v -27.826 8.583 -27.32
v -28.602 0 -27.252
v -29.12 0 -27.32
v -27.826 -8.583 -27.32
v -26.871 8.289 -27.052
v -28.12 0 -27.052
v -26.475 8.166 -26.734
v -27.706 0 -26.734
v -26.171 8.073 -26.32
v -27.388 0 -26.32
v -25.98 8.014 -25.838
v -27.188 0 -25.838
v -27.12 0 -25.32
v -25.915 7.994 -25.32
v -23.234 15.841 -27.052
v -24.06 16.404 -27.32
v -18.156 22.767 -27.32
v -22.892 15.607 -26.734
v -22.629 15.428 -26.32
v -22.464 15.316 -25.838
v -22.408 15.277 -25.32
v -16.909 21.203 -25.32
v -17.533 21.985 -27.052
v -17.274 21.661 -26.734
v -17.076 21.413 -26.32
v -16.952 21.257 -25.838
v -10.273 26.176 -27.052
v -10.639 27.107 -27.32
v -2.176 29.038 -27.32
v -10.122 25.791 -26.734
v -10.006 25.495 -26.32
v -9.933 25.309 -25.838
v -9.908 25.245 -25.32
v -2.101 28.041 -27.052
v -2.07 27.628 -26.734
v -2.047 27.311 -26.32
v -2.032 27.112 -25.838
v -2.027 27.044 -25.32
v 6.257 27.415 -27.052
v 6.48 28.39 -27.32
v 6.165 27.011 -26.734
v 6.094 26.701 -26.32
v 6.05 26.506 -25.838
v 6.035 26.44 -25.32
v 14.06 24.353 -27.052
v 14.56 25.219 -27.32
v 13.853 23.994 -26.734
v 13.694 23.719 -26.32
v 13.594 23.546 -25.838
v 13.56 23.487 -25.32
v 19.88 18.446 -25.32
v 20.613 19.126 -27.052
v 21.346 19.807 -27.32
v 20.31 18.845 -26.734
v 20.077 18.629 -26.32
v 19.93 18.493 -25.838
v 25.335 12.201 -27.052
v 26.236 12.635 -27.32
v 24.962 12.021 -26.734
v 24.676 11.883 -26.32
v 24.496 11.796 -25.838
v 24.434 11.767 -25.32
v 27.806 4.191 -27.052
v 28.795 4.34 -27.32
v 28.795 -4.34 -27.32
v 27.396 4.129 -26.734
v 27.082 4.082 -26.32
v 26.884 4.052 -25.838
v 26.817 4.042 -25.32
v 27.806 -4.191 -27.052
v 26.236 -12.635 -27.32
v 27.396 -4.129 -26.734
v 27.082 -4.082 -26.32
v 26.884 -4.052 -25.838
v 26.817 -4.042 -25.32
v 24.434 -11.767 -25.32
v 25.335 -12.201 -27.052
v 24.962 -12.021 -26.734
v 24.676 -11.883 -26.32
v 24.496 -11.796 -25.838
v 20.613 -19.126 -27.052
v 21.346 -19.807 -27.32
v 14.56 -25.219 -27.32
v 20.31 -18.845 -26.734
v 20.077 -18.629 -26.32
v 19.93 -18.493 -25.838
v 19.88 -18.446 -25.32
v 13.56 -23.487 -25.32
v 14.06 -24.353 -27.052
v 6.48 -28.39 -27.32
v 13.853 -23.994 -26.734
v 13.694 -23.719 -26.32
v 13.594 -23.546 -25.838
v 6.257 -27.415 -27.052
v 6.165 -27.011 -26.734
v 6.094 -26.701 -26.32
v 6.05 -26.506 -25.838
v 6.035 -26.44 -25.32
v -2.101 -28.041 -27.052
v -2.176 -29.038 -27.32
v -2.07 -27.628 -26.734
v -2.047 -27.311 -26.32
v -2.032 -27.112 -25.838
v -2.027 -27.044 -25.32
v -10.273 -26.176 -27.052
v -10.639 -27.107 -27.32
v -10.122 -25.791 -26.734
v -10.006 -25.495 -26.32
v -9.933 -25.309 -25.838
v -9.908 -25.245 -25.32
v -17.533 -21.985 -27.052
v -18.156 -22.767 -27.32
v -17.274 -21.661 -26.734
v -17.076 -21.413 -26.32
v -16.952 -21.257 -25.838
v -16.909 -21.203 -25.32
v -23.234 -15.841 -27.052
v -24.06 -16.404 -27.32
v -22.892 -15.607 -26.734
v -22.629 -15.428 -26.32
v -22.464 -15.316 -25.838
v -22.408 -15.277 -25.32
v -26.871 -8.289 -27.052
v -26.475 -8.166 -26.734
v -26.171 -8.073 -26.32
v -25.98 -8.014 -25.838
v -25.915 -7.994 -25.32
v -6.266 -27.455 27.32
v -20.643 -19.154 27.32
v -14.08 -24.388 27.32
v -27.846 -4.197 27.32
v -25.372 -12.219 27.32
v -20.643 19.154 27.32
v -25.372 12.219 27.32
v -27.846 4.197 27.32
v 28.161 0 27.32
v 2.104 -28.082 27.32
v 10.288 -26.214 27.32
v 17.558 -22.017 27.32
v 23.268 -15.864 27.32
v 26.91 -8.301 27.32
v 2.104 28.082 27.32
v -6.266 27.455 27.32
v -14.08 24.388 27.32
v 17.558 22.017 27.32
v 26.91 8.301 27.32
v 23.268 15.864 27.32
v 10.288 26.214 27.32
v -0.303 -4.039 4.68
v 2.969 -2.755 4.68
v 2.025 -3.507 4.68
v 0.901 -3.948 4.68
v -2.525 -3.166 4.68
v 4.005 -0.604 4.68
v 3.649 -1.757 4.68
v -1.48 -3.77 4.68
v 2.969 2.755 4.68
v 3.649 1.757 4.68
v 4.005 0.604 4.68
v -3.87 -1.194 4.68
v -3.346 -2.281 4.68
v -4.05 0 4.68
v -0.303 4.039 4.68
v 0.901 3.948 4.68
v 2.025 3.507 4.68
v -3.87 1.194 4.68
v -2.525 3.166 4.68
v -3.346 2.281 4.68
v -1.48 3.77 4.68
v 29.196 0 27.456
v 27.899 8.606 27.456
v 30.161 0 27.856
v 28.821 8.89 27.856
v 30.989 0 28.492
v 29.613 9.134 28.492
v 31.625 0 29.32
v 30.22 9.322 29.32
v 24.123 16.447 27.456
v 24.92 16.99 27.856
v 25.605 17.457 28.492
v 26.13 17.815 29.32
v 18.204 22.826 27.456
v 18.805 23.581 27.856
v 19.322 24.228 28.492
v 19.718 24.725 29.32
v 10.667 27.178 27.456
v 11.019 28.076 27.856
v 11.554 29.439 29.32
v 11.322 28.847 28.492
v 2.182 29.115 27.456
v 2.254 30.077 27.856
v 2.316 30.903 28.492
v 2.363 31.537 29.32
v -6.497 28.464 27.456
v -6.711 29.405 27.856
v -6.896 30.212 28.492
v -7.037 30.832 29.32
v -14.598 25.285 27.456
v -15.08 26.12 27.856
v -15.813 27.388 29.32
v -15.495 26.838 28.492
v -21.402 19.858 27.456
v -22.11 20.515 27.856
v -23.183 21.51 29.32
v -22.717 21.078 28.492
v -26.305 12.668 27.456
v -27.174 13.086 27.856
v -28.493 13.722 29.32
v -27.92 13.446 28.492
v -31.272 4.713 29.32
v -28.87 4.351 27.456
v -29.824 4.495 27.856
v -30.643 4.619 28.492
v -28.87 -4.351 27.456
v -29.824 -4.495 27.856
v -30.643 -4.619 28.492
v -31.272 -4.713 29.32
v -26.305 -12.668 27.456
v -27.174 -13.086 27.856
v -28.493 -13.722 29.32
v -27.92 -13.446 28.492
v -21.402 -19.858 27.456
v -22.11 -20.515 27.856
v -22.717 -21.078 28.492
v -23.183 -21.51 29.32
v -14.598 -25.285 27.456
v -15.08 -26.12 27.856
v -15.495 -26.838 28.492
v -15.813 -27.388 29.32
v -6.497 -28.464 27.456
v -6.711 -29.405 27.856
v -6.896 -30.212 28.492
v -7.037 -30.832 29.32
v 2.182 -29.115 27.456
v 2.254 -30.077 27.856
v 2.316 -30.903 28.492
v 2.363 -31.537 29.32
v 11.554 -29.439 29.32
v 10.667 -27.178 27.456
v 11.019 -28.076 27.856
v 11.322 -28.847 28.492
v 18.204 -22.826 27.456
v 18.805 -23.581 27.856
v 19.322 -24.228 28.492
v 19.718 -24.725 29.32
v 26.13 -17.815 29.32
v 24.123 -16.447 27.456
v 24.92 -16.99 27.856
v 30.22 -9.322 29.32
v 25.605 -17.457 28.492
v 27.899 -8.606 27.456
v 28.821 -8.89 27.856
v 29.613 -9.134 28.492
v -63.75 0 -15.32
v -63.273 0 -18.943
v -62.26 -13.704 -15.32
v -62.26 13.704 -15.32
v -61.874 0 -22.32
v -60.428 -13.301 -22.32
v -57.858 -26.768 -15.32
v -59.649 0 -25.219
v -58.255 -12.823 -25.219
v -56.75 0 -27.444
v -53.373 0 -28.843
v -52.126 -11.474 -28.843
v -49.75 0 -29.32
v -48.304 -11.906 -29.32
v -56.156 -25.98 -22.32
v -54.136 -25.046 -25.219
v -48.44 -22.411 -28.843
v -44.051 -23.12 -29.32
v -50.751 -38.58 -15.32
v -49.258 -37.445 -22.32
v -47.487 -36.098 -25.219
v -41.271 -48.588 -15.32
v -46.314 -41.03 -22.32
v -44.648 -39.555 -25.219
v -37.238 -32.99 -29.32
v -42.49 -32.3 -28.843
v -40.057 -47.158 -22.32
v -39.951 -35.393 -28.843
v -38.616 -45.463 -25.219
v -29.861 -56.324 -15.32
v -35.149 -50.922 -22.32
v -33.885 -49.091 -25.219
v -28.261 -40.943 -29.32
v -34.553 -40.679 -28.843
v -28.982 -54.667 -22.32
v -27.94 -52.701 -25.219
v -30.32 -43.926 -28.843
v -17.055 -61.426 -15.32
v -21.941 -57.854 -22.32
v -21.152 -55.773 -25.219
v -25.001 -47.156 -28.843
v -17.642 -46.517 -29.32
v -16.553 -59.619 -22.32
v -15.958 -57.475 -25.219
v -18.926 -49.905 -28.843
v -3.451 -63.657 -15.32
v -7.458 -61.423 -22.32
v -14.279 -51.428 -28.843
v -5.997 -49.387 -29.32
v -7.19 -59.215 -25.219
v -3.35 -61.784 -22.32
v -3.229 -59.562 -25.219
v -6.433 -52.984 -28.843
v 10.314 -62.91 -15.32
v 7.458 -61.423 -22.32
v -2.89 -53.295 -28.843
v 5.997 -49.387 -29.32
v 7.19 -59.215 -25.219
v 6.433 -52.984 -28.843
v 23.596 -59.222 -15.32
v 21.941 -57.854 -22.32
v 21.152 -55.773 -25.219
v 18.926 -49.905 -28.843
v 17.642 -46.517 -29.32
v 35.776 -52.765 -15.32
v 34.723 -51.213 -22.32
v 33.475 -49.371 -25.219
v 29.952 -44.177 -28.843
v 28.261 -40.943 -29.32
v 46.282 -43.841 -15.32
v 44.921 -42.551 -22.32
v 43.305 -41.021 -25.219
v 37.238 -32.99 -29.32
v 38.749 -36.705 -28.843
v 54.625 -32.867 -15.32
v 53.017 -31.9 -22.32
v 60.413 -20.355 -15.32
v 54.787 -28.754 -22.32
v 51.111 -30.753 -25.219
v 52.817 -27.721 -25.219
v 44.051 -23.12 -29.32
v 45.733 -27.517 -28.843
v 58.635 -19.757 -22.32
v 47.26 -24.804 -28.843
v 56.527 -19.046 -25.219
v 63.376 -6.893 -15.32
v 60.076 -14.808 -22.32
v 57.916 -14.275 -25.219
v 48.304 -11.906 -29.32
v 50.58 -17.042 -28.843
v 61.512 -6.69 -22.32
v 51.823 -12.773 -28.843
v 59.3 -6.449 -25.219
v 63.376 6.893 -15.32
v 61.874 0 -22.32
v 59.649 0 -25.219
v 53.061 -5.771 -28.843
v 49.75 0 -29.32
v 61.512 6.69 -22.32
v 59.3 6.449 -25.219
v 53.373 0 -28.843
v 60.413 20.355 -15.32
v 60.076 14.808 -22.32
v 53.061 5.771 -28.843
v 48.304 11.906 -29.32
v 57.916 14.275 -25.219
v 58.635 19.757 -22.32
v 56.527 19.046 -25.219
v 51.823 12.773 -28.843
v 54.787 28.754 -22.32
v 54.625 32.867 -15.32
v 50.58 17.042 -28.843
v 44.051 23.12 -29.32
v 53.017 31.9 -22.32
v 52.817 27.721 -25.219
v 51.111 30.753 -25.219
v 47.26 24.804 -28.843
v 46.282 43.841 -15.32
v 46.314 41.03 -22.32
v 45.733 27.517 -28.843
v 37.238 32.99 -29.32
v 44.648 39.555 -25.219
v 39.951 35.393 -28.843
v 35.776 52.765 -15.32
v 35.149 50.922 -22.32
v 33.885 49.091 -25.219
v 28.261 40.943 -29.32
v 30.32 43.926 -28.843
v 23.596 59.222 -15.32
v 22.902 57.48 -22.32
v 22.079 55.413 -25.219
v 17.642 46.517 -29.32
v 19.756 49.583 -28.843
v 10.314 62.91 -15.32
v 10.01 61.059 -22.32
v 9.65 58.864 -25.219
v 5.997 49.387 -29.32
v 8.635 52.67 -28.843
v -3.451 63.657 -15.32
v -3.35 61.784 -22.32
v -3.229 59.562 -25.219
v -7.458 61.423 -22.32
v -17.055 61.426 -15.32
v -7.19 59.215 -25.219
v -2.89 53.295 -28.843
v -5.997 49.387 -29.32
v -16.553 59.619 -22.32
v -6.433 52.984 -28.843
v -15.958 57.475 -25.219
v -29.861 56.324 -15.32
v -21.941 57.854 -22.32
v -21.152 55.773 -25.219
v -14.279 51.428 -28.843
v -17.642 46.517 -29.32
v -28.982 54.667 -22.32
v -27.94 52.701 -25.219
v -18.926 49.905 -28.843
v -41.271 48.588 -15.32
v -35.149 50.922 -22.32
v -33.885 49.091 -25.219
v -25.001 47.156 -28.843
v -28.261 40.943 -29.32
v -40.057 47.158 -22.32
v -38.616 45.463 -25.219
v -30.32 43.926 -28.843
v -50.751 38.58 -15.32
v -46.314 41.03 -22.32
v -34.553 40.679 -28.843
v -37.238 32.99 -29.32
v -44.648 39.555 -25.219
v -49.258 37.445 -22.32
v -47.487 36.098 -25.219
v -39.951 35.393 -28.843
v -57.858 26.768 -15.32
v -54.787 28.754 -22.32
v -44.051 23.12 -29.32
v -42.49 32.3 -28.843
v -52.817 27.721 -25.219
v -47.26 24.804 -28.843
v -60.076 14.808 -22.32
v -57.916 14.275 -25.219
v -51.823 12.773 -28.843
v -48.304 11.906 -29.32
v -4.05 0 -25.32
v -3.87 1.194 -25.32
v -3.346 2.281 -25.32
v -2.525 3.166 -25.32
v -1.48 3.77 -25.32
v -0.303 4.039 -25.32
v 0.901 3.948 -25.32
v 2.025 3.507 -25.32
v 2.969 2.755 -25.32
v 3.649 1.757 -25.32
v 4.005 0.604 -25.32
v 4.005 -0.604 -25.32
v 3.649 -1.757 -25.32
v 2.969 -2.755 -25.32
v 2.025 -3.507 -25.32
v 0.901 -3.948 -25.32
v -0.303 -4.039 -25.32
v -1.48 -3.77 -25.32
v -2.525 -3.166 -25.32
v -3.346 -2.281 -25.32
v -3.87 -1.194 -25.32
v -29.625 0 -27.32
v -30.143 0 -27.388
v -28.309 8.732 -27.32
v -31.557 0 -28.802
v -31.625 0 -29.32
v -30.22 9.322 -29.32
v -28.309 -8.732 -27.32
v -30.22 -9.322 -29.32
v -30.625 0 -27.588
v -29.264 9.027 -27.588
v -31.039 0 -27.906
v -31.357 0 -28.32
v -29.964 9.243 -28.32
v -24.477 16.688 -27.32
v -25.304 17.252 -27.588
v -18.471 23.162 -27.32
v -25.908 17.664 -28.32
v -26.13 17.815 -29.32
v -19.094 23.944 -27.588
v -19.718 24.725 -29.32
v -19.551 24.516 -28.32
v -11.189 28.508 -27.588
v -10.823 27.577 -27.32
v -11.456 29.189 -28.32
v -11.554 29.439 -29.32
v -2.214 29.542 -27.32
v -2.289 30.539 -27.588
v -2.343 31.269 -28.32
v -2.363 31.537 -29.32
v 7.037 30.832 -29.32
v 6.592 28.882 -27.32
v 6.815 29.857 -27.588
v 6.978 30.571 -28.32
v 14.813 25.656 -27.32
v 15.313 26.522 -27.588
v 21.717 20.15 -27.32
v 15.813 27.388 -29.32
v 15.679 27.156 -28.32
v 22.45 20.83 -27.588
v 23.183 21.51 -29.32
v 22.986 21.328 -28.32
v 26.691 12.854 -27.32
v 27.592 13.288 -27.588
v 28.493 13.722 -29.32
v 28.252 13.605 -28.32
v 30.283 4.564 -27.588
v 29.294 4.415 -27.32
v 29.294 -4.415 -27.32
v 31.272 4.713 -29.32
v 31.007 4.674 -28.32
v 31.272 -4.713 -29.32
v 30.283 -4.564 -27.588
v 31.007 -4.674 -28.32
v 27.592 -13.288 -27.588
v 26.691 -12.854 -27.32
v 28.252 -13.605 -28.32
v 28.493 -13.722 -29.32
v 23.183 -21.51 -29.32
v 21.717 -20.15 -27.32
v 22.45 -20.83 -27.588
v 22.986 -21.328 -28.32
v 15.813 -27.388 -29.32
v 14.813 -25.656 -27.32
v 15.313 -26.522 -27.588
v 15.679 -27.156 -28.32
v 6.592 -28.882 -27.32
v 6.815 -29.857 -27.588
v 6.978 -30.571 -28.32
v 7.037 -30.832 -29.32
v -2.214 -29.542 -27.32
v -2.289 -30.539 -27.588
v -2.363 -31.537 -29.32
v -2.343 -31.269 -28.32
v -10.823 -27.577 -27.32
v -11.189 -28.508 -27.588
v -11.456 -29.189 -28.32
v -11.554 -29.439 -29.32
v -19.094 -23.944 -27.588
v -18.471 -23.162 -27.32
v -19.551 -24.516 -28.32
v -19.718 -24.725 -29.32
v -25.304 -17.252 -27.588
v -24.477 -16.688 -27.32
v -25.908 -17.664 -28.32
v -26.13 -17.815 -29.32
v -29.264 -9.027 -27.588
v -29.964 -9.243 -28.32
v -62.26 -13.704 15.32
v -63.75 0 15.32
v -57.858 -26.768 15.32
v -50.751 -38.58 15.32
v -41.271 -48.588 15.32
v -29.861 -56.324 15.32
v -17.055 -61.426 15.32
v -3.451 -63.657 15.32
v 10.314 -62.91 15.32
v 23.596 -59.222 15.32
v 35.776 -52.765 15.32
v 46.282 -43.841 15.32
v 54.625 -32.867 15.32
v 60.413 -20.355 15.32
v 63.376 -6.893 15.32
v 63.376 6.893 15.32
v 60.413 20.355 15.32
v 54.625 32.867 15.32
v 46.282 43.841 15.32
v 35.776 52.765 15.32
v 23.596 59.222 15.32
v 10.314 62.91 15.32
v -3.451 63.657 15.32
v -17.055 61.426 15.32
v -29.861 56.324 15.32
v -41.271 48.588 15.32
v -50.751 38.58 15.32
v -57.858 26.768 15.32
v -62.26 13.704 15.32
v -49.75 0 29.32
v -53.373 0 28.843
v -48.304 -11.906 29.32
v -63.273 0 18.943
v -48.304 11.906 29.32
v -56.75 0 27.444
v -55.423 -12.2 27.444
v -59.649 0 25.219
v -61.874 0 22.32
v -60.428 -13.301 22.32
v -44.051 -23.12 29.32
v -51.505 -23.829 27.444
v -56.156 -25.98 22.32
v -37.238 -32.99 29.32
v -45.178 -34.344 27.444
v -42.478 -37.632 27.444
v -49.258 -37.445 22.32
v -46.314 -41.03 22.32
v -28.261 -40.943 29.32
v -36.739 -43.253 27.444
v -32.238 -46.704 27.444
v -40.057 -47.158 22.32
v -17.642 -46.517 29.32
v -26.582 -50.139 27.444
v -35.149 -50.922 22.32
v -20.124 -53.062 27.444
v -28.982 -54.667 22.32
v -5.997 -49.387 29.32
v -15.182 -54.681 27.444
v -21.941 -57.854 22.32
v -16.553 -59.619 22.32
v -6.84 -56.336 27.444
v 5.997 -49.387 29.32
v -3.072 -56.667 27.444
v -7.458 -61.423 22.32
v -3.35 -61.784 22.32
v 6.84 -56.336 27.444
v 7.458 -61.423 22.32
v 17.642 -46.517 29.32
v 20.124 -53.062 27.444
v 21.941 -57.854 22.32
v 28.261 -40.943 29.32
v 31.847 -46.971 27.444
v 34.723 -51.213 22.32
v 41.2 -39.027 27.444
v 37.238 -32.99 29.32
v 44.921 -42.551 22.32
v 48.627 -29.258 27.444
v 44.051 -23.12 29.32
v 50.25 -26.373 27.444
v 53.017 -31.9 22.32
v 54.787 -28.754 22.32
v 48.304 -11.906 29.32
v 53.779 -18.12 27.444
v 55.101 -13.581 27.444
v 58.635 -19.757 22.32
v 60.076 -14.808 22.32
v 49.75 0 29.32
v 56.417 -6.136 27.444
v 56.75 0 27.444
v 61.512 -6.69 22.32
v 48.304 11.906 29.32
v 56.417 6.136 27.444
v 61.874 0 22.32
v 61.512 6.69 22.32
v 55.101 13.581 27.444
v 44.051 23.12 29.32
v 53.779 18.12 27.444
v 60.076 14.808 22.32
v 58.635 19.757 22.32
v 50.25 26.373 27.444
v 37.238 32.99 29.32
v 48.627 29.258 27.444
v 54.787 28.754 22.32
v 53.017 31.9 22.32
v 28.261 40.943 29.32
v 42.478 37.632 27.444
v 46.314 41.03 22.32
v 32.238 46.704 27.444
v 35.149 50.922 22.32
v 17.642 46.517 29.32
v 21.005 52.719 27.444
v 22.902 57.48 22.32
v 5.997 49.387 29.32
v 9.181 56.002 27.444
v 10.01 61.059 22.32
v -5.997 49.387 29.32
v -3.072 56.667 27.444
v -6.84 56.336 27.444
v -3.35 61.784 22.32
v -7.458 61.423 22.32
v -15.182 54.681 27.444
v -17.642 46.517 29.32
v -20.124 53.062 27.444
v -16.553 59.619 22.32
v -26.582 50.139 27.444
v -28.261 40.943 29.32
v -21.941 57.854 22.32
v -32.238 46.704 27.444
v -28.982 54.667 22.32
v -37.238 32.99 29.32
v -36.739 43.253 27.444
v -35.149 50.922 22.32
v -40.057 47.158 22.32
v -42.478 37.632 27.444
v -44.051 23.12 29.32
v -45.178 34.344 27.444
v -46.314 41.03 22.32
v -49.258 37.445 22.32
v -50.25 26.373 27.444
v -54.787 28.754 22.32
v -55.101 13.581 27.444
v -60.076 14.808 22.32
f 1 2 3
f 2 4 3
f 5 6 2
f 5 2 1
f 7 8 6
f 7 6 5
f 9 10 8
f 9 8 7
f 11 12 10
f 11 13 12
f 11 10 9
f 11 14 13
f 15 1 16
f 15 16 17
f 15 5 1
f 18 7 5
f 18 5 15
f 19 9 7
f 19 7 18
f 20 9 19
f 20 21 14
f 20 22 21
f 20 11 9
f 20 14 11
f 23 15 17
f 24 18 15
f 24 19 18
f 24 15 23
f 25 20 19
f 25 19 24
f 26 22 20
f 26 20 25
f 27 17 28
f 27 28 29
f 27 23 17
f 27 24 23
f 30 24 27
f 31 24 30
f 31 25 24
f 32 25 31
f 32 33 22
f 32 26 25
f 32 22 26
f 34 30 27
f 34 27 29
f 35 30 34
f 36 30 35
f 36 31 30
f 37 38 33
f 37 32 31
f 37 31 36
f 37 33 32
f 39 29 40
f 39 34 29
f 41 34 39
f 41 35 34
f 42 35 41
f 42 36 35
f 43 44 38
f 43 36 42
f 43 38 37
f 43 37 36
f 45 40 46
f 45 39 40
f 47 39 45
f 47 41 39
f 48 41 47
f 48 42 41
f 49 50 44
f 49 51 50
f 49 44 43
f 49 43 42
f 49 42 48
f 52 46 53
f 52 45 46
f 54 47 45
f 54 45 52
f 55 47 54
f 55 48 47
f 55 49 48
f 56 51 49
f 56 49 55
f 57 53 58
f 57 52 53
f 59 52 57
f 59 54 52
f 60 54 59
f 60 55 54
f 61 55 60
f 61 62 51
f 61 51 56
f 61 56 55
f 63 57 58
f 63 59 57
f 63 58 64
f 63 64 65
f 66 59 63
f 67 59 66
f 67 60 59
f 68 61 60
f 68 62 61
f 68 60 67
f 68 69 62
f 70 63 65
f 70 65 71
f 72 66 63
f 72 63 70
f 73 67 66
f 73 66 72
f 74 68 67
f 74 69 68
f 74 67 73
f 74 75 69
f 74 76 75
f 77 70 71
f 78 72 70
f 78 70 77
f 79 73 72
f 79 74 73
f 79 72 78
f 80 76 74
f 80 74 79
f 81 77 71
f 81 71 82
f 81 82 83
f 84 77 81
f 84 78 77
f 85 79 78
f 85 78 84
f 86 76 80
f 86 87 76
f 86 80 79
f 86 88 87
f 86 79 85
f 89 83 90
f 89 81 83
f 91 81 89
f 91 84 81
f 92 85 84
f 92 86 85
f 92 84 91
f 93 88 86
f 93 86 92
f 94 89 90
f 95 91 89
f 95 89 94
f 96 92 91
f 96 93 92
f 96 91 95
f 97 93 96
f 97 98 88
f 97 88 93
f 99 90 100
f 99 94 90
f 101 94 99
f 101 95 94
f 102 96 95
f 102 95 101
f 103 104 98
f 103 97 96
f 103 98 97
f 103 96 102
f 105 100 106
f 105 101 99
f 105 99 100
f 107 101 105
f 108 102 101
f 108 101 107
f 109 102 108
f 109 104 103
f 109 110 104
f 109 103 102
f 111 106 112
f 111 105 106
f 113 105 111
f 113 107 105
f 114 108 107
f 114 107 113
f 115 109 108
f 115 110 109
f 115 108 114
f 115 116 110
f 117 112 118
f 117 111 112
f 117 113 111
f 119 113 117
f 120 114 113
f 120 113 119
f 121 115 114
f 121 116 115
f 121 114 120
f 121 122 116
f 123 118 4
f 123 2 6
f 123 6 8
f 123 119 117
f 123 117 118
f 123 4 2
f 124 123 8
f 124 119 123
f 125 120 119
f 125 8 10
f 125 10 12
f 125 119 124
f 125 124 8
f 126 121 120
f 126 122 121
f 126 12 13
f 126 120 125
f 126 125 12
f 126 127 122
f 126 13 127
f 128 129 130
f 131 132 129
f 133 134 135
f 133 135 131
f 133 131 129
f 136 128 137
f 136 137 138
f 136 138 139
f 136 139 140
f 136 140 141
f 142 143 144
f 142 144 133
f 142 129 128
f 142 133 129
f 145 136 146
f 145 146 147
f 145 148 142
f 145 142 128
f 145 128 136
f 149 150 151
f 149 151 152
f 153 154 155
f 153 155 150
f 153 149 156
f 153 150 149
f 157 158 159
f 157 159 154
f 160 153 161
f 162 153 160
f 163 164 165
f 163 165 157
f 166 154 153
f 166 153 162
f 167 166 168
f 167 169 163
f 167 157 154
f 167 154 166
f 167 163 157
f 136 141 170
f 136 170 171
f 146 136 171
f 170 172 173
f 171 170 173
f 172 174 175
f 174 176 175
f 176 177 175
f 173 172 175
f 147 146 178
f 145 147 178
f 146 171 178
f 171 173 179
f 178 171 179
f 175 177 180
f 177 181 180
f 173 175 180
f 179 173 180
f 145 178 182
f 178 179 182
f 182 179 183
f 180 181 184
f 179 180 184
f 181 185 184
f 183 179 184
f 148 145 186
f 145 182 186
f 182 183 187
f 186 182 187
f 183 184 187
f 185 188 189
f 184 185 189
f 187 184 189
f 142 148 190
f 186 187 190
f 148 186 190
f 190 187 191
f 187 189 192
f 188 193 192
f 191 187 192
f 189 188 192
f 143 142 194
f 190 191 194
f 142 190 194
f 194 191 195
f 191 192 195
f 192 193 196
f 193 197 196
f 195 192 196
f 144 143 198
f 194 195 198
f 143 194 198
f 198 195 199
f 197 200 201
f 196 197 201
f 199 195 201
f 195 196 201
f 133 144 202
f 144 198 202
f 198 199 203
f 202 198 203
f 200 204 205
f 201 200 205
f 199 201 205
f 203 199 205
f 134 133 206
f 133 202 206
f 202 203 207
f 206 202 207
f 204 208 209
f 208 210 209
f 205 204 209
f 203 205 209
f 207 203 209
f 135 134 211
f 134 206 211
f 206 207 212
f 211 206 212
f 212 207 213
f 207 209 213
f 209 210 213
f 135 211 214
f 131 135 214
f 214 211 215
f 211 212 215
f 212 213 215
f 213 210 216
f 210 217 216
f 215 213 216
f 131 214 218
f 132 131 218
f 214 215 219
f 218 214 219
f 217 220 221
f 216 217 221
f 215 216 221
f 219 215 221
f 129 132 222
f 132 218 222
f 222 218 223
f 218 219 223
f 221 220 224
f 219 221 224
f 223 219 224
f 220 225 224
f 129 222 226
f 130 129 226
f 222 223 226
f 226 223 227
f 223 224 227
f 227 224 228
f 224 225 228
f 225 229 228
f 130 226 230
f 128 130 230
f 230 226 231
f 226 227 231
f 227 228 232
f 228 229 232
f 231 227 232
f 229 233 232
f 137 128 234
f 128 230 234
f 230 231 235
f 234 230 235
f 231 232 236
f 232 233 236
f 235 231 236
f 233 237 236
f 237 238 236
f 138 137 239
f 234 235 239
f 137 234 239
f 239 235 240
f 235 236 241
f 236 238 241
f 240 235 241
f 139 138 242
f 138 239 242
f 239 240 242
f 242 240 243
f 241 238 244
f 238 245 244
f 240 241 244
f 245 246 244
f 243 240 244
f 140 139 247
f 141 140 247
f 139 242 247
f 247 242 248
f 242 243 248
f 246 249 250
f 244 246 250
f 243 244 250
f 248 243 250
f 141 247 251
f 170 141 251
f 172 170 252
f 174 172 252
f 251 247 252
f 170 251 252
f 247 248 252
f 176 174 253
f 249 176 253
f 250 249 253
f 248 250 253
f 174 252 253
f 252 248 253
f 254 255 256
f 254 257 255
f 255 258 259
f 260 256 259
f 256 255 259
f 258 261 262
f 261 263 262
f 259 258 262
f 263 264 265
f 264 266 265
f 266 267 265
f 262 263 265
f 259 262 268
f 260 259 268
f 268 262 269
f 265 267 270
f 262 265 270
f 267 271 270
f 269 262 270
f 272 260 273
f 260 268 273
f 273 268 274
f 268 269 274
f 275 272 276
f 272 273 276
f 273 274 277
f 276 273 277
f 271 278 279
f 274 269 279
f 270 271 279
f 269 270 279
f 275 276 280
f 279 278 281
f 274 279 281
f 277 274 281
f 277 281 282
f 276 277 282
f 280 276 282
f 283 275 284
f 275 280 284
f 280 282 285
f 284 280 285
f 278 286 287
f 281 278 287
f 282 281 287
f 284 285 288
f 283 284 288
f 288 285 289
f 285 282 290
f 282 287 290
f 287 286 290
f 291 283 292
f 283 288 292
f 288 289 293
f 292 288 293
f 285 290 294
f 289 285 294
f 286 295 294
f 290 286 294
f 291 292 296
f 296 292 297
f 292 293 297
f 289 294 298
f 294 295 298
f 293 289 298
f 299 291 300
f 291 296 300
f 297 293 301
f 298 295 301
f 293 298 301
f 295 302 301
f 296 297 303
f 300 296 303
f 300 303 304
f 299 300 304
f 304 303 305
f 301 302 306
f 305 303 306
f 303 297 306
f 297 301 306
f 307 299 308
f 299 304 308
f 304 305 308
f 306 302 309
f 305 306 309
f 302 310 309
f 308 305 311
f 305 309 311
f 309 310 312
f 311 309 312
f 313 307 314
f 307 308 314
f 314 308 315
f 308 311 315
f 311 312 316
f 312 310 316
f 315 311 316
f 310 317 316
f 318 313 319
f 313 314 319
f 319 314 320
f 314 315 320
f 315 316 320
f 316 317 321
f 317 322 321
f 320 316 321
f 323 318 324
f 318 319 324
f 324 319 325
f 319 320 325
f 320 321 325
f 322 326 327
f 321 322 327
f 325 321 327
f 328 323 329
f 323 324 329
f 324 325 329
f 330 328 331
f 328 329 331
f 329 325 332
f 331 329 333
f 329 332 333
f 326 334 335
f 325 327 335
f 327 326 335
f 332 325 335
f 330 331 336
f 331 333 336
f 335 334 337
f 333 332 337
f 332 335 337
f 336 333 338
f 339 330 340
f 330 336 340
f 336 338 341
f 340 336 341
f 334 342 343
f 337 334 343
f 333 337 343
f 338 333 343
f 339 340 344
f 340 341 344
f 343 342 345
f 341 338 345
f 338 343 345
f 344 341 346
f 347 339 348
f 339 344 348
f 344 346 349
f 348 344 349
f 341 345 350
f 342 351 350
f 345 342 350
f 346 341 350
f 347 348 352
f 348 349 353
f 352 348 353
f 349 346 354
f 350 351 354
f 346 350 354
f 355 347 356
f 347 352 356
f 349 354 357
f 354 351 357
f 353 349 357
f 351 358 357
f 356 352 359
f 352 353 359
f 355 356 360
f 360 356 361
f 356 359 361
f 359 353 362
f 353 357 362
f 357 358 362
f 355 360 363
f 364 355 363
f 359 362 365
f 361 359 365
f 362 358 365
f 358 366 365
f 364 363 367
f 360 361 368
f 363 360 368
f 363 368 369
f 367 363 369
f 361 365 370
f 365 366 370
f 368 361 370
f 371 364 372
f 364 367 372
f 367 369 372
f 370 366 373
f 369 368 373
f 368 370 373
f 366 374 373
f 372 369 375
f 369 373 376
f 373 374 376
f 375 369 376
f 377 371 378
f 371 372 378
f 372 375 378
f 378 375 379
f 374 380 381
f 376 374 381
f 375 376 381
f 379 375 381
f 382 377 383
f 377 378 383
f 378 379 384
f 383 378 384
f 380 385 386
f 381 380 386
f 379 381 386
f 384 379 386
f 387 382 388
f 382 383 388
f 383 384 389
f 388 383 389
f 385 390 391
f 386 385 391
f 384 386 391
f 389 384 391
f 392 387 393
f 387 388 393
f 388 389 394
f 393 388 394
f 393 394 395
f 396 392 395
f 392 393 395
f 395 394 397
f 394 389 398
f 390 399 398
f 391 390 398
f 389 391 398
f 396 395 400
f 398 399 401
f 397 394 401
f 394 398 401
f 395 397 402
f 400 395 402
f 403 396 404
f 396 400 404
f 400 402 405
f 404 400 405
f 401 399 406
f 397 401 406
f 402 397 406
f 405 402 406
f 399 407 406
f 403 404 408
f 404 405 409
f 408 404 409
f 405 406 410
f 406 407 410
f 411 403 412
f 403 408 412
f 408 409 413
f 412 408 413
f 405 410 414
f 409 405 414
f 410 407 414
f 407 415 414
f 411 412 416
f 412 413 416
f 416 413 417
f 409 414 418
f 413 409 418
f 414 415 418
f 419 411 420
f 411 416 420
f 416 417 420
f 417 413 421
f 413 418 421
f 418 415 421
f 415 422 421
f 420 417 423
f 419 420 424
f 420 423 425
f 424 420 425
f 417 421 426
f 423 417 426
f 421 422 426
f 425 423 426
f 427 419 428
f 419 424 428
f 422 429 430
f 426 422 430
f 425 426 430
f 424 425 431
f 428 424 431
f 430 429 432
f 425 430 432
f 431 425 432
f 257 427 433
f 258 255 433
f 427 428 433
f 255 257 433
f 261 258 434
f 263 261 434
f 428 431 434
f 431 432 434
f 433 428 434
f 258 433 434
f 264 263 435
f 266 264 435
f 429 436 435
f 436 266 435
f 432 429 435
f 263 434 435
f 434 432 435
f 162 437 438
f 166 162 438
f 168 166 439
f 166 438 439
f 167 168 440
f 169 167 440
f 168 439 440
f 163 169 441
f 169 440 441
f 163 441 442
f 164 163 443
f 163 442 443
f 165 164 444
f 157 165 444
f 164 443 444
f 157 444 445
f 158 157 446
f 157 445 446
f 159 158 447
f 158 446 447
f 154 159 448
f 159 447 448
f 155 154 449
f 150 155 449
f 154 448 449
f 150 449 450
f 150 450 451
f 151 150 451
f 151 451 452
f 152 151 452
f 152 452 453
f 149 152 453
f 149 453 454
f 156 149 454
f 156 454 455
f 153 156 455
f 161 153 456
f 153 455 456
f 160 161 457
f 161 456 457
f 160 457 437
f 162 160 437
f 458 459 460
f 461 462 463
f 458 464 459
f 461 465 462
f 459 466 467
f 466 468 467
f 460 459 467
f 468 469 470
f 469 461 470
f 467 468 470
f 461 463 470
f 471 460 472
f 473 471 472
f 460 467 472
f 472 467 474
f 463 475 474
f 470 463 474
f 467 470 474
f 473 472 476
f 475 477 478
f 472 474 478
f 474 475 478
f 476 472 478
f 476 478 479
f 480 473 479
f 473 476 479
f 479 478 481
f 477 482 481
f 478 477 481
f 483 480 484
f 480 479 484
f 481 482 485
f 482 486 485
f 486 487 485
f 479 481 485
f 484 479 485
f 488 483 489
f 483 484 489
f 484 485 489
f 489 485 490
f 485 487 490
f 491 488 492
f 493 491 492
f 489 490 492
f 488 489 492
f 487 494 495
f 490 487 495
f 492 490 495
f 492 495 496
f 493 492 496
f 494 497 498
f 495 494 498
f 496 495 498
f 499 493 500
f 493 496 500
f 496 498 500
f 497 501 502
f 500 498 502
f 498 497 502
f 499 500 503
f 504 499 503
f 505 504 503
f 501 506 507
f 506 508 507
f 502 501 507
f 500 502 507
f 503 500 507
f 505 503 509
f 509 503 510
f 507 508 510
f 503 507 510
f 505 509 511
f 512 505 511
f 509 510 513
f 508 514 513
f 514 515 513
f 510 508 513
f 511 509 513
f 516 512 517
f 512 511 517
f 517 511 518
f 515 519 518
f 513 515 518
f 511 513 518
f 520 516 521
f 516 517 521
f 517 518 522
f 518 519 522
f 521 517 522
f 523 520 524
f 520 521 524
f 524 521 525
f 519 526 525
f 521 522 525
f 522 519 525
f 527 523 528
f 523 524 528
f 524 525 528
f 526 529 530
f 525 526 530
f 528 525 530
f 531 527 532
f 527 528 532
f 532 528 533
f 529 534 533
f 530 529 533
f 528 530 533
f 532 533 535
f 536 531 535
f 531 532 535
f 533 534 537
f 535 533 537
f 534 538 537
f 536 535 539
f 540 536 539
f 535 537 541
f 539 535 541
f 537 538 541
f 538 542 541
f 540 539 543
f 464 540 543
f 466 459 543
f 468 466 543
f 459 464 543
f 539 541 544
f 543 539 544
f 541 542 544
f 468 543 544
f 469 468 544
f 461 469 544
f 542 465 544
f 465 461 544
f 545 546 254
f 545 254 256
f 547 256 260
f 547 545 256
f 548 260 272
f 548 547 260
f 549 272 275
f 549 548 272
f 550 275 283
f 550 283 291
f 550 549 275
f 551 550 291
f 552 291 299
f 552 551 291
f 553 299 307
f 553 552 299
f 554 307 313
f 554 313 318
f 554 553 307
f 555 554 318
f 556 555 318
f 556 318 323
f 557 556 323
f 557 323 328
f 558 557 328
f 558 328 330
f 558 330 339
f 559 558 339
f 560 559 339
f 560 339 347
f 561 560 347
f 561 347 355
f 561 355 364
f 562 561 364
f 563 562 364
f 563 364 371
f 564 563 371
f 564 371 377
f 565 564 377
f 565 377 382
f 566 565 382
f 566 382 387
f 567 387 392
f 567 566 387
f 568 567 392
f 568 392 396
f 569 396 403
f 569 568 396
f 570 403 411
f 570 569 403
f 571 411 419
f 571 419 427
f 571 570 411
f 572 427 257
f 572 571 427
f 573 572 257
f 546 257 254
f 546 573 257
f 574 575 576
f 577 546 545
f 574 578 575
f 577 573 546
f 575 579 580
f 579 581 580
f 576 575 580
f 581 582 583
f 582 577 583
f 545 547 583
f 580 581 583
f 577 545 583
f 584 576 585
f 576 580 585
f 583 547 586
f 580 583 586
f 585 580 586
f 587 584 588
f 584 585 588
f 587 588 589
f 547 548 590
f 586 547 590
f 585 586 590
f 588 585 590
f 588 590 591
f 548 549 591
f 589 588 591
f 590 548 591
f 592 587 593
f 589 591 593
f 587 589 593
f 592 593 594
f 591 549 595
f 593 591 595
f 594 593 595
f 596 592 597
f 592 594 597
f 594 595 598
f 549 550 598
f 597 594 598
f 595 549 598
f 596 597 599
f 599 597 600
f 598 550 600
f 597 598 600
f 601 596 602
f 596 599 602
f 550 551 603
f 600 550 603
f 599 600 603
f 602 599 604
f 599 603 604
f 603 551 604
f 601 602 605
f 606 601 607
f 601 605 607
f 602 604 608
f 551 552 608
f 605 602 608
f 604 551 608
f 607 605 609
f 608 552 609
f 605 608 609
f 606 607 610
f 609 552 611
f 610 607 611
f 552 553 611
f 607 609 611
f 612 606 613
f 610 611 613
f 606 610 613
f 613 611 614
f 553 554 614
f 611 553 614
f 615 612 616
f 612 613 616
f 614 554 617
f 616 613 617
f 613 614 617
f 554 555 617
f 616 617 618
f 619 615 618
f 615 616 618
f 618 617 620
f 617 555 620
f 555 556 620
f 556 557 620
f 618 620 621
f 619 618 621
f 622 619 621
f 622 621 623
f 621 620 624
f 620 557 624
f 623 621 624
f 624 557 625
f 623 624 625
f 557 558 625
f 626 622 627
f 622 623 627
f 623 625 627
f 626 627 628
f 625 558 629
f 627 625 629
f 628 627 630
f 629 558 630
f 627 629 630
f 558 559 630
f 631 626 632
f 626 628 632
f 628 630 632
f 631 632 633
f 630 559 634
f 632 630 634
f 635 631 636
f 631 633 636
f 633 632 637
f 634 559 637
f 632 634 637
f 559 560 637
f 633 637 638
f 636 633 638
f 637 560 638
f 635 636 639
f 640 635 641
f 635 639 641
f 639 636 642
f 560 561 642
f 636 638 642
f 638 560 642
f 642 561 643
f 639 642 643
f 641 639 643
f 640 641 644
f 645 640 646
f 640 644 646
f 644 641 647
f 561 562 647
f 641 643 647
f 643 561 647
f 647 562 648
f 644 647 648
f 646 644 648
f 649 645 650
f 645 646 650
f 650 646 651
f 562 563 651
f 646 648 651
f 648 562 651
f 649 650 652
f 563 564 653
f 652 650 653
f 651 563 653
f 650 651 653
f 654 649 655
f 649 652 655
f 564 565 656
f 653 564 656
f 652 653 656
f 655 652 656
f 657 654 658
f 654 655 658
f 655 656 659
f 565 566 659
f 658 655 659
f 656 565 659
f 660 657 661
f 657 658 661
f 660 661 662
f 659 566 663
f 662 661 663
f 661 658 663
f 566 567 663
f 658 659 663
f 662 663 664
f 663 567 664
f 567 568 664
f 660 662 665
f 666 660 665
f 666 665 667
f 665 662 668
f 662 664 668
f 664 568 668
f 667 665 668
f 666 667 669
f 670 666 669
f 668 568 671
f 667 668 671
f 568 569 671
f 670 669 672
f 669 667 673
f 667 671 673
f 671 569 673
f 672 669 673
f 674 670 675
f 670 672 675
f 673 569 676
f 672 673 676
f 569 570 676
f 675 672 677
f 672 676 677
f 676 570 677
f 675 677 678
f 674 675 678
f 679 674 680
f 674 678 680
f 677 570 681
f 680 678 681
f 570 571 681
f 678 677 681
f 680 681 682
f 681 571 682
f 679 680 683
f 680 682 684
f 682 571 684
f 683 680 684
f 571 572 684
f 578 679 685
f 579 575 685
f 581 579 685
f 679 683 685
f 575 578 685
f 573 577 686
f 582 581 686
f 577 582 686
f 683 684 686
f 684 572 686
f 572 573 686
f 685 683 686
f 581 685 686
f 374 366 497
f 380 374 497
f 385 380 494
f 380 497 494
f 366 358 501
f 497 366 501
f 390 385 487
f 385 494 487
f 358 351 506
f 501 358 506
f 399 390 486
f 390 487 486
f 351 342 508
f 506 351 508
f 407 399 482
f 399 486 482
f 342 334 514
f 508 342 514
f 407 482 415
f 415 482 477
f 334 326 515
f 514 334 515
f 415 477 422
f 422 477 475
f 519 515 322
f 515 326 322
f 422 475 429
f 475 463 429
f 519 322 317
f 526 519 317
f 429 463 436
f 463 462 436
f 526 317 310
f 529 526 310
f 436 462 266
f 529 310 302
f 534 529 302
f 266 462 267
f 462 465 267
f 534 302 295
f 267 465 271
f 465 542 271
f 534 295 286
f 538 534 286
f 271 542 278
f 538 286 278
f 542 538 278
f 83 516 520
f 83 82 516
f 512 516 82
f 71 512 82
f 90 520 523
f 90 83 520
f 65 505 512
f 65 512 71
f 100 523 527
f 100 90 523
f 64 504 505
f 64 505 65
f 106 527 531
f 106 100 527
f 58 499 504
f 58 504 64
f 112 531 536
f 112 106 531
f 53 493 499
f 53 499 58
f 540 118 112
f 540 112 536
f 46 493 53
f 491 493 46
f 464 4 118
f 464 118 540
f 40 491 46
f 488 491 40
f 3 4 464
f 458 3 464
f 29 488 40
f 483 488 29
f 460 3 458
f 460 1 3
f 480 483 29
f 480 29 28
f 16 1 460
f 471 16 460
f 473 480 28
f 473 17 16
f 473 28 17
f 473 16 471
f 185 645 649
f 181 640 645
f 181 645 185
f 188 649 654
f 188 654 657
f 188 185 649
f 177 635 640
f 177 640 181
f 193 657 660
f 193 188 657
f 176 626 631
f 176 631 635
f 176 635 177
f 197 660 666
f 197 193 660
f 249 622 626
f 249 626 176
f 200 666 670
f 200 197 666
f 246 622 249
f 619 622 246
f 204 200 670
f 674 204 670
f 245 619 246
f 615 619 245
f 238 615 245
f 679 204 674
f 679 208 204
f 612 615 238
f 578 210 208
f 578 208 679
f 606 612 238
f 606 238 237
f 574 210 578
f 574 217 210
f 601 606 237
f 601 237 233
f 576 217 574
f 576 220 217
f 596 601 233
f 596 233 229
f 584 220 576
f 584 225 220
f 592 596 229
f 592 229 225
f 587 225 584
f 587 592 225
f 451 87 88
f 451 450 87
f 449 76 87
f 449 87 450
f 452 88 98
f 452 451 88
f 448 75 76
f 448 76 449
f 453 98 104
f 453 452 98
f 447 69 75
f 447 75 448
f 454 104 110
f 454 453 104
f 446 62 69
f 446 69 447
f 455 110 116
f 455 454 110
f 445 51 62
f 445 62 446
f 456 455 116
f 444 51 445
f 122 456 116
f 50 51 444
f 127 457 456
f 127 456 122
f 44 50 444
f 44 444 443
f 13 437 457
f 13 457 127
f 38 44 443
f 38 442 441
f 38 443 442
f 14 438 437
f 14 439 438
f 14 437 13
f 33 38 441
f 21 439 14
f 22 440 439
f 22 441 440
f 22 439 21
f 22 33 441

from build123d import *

# Parameters (mm, degrees)
CROQUIS1_R              = 63.75
SALIENTE_EXTRUIR1_DEPTH = 29.32
CROQUIS2_R              = 31.625
CORTAR_EXTRUIR1_DEPTH   = 2
REDONDEO2_R             = 4
REDONDEO3_R             = 14
CROQUIS4_R              = 31.625
CORTAR_EXTRUIR3_DEPTH   = 2
CROQUIS5_R              = 27.12
CORTAR_EXTRUIR4_DEPTH   = 2
REDONDEO4_R             = 14
CROQUIS6_R              = 4.05
CORTAR_EXTRUIR5_DEPTH   = 30
REDONDEO5_R             = 2
REDONDEO6_R             = 2


# Some blends are built 0.0001 mm under size
with BuildPart() as part:
    # Croquis1 → Saliente-Extruir1 (new, symmetric)
    with BuildSketch(Plane.XY):
        with Locations(Location((0, 0, 0), (0, 0, 180))):
            Circle(CROQUIS1_R)
    extrude(amount=SALIENTE_EXTRUIR1_DEPTH, both=True)

    # Croquis2 → Cortar-Extruir1 (cut)
    with BuildSketch(Plane.XY.offset(29.32)):
        Circle(CROQUIS2_R)
    extrude(amount=-CORTAR_EXTRUIR1_DEPTH, mode=Mode.SUBTRACT)

    # Redondeo2
    # the kernel refuses this fillet: 4 mm, written as the material it adds along each edge
    with BuildSketch(Plane(origin=(0, 0, 27.32), x_dir=(1, 0, 0), z_dir=(0, -1, 0))) as redondeo2_piece_1:
        with BuildLine():
            CenterArc((28.160898385, 4), REDONDEO2_R, 270, 60)
            Line((28.160898385, 0), (28.160898385, -0.08))
            Line((28.160898385, -0.08), (31.625, -0.08))
            Line((31.625, -0.08), (31.705, 0))
            ThreePointArc((31.705, 0), (31.705, 1), (31.694282032, 1.96))
            Line((31.694282032, 1.96), (31.625, 2))
        make_face()
    revolve(axis=Axis((0, 0, 27.32), (0, 0, 1)))

    # Redondeo3
    redondeo3_edges = [part.edges().sort_by_distance(p)[0] for p in [
        (63.75, 0, 29.32),
    ]]
    fillet(redondeo3_edges, radius=REDONDEO3_R)

    # Croquis4 → Cortar-Extruir3 (cut)
    with BuildSketch(Plane(origin=(0, 0, -29.32), x_dir=(-1, 0, 0), z_dir=(0, 0, -1))):
        Circle(CROQUIS4_R)
    extrude(amount=-CORTAR_EXTRUIR3_DEPTH, mode=Mode.SUBTRACT)

    # Croquis5 → Cortar-Extruir4 (cut)
    with BuildSketch(Plane(origin=(0, 0, -27.32), x_dir=(-1, 0, 0), z_dir=(0, 0, -1))):
        Circle(CROQUIS5_R)
    extrude(amount=-CORTAR_EXTRUIR4_DEPTH, mode=Mode.SUBTRACT)

    # Redondeo4
    redondeo4_edges = [part.edges().sort_by_distance(p)[0] for p in [
        (63.75, 0, -29.32),
    ]]
    fillet(redondeo4_edges, radius=REDONDEO4_R)

    # Croquis6 → Cortar-Extruir5 (cut)
    with BuildSketch(Plane(origin=(0, 0, -25.32), x_dir=(-1, 0, 0), z_dir=(0, 0, -1))):
        Circle(CROQUIS6_R)
    extrude(amount=-CORTAR_EXTRUIR5_DEPTH, mode=Mode.SUBTRACT)

    # Redondeo5
    redondeo5_edges = [part.edges().sort_by_distance(p)[0] for p in [
        (27.12, 0, -27.32),
    ]]
    fillet(redondeo5_edges, radius=REDONDEO5_R - 0.0001)  # a hair under: the kernel refuses the full size

    # Redondeo6
    redondeo6_edges = [part.edges().sort_by_distance(p)[0] for p in [
        (31.625, 0, -27.32),
    ]]
    fillet(redondeo6_edges, radius=REDONDEO6_R - 0.0001)  # a hair under: the kernel refuses the full size


solid = part.part
